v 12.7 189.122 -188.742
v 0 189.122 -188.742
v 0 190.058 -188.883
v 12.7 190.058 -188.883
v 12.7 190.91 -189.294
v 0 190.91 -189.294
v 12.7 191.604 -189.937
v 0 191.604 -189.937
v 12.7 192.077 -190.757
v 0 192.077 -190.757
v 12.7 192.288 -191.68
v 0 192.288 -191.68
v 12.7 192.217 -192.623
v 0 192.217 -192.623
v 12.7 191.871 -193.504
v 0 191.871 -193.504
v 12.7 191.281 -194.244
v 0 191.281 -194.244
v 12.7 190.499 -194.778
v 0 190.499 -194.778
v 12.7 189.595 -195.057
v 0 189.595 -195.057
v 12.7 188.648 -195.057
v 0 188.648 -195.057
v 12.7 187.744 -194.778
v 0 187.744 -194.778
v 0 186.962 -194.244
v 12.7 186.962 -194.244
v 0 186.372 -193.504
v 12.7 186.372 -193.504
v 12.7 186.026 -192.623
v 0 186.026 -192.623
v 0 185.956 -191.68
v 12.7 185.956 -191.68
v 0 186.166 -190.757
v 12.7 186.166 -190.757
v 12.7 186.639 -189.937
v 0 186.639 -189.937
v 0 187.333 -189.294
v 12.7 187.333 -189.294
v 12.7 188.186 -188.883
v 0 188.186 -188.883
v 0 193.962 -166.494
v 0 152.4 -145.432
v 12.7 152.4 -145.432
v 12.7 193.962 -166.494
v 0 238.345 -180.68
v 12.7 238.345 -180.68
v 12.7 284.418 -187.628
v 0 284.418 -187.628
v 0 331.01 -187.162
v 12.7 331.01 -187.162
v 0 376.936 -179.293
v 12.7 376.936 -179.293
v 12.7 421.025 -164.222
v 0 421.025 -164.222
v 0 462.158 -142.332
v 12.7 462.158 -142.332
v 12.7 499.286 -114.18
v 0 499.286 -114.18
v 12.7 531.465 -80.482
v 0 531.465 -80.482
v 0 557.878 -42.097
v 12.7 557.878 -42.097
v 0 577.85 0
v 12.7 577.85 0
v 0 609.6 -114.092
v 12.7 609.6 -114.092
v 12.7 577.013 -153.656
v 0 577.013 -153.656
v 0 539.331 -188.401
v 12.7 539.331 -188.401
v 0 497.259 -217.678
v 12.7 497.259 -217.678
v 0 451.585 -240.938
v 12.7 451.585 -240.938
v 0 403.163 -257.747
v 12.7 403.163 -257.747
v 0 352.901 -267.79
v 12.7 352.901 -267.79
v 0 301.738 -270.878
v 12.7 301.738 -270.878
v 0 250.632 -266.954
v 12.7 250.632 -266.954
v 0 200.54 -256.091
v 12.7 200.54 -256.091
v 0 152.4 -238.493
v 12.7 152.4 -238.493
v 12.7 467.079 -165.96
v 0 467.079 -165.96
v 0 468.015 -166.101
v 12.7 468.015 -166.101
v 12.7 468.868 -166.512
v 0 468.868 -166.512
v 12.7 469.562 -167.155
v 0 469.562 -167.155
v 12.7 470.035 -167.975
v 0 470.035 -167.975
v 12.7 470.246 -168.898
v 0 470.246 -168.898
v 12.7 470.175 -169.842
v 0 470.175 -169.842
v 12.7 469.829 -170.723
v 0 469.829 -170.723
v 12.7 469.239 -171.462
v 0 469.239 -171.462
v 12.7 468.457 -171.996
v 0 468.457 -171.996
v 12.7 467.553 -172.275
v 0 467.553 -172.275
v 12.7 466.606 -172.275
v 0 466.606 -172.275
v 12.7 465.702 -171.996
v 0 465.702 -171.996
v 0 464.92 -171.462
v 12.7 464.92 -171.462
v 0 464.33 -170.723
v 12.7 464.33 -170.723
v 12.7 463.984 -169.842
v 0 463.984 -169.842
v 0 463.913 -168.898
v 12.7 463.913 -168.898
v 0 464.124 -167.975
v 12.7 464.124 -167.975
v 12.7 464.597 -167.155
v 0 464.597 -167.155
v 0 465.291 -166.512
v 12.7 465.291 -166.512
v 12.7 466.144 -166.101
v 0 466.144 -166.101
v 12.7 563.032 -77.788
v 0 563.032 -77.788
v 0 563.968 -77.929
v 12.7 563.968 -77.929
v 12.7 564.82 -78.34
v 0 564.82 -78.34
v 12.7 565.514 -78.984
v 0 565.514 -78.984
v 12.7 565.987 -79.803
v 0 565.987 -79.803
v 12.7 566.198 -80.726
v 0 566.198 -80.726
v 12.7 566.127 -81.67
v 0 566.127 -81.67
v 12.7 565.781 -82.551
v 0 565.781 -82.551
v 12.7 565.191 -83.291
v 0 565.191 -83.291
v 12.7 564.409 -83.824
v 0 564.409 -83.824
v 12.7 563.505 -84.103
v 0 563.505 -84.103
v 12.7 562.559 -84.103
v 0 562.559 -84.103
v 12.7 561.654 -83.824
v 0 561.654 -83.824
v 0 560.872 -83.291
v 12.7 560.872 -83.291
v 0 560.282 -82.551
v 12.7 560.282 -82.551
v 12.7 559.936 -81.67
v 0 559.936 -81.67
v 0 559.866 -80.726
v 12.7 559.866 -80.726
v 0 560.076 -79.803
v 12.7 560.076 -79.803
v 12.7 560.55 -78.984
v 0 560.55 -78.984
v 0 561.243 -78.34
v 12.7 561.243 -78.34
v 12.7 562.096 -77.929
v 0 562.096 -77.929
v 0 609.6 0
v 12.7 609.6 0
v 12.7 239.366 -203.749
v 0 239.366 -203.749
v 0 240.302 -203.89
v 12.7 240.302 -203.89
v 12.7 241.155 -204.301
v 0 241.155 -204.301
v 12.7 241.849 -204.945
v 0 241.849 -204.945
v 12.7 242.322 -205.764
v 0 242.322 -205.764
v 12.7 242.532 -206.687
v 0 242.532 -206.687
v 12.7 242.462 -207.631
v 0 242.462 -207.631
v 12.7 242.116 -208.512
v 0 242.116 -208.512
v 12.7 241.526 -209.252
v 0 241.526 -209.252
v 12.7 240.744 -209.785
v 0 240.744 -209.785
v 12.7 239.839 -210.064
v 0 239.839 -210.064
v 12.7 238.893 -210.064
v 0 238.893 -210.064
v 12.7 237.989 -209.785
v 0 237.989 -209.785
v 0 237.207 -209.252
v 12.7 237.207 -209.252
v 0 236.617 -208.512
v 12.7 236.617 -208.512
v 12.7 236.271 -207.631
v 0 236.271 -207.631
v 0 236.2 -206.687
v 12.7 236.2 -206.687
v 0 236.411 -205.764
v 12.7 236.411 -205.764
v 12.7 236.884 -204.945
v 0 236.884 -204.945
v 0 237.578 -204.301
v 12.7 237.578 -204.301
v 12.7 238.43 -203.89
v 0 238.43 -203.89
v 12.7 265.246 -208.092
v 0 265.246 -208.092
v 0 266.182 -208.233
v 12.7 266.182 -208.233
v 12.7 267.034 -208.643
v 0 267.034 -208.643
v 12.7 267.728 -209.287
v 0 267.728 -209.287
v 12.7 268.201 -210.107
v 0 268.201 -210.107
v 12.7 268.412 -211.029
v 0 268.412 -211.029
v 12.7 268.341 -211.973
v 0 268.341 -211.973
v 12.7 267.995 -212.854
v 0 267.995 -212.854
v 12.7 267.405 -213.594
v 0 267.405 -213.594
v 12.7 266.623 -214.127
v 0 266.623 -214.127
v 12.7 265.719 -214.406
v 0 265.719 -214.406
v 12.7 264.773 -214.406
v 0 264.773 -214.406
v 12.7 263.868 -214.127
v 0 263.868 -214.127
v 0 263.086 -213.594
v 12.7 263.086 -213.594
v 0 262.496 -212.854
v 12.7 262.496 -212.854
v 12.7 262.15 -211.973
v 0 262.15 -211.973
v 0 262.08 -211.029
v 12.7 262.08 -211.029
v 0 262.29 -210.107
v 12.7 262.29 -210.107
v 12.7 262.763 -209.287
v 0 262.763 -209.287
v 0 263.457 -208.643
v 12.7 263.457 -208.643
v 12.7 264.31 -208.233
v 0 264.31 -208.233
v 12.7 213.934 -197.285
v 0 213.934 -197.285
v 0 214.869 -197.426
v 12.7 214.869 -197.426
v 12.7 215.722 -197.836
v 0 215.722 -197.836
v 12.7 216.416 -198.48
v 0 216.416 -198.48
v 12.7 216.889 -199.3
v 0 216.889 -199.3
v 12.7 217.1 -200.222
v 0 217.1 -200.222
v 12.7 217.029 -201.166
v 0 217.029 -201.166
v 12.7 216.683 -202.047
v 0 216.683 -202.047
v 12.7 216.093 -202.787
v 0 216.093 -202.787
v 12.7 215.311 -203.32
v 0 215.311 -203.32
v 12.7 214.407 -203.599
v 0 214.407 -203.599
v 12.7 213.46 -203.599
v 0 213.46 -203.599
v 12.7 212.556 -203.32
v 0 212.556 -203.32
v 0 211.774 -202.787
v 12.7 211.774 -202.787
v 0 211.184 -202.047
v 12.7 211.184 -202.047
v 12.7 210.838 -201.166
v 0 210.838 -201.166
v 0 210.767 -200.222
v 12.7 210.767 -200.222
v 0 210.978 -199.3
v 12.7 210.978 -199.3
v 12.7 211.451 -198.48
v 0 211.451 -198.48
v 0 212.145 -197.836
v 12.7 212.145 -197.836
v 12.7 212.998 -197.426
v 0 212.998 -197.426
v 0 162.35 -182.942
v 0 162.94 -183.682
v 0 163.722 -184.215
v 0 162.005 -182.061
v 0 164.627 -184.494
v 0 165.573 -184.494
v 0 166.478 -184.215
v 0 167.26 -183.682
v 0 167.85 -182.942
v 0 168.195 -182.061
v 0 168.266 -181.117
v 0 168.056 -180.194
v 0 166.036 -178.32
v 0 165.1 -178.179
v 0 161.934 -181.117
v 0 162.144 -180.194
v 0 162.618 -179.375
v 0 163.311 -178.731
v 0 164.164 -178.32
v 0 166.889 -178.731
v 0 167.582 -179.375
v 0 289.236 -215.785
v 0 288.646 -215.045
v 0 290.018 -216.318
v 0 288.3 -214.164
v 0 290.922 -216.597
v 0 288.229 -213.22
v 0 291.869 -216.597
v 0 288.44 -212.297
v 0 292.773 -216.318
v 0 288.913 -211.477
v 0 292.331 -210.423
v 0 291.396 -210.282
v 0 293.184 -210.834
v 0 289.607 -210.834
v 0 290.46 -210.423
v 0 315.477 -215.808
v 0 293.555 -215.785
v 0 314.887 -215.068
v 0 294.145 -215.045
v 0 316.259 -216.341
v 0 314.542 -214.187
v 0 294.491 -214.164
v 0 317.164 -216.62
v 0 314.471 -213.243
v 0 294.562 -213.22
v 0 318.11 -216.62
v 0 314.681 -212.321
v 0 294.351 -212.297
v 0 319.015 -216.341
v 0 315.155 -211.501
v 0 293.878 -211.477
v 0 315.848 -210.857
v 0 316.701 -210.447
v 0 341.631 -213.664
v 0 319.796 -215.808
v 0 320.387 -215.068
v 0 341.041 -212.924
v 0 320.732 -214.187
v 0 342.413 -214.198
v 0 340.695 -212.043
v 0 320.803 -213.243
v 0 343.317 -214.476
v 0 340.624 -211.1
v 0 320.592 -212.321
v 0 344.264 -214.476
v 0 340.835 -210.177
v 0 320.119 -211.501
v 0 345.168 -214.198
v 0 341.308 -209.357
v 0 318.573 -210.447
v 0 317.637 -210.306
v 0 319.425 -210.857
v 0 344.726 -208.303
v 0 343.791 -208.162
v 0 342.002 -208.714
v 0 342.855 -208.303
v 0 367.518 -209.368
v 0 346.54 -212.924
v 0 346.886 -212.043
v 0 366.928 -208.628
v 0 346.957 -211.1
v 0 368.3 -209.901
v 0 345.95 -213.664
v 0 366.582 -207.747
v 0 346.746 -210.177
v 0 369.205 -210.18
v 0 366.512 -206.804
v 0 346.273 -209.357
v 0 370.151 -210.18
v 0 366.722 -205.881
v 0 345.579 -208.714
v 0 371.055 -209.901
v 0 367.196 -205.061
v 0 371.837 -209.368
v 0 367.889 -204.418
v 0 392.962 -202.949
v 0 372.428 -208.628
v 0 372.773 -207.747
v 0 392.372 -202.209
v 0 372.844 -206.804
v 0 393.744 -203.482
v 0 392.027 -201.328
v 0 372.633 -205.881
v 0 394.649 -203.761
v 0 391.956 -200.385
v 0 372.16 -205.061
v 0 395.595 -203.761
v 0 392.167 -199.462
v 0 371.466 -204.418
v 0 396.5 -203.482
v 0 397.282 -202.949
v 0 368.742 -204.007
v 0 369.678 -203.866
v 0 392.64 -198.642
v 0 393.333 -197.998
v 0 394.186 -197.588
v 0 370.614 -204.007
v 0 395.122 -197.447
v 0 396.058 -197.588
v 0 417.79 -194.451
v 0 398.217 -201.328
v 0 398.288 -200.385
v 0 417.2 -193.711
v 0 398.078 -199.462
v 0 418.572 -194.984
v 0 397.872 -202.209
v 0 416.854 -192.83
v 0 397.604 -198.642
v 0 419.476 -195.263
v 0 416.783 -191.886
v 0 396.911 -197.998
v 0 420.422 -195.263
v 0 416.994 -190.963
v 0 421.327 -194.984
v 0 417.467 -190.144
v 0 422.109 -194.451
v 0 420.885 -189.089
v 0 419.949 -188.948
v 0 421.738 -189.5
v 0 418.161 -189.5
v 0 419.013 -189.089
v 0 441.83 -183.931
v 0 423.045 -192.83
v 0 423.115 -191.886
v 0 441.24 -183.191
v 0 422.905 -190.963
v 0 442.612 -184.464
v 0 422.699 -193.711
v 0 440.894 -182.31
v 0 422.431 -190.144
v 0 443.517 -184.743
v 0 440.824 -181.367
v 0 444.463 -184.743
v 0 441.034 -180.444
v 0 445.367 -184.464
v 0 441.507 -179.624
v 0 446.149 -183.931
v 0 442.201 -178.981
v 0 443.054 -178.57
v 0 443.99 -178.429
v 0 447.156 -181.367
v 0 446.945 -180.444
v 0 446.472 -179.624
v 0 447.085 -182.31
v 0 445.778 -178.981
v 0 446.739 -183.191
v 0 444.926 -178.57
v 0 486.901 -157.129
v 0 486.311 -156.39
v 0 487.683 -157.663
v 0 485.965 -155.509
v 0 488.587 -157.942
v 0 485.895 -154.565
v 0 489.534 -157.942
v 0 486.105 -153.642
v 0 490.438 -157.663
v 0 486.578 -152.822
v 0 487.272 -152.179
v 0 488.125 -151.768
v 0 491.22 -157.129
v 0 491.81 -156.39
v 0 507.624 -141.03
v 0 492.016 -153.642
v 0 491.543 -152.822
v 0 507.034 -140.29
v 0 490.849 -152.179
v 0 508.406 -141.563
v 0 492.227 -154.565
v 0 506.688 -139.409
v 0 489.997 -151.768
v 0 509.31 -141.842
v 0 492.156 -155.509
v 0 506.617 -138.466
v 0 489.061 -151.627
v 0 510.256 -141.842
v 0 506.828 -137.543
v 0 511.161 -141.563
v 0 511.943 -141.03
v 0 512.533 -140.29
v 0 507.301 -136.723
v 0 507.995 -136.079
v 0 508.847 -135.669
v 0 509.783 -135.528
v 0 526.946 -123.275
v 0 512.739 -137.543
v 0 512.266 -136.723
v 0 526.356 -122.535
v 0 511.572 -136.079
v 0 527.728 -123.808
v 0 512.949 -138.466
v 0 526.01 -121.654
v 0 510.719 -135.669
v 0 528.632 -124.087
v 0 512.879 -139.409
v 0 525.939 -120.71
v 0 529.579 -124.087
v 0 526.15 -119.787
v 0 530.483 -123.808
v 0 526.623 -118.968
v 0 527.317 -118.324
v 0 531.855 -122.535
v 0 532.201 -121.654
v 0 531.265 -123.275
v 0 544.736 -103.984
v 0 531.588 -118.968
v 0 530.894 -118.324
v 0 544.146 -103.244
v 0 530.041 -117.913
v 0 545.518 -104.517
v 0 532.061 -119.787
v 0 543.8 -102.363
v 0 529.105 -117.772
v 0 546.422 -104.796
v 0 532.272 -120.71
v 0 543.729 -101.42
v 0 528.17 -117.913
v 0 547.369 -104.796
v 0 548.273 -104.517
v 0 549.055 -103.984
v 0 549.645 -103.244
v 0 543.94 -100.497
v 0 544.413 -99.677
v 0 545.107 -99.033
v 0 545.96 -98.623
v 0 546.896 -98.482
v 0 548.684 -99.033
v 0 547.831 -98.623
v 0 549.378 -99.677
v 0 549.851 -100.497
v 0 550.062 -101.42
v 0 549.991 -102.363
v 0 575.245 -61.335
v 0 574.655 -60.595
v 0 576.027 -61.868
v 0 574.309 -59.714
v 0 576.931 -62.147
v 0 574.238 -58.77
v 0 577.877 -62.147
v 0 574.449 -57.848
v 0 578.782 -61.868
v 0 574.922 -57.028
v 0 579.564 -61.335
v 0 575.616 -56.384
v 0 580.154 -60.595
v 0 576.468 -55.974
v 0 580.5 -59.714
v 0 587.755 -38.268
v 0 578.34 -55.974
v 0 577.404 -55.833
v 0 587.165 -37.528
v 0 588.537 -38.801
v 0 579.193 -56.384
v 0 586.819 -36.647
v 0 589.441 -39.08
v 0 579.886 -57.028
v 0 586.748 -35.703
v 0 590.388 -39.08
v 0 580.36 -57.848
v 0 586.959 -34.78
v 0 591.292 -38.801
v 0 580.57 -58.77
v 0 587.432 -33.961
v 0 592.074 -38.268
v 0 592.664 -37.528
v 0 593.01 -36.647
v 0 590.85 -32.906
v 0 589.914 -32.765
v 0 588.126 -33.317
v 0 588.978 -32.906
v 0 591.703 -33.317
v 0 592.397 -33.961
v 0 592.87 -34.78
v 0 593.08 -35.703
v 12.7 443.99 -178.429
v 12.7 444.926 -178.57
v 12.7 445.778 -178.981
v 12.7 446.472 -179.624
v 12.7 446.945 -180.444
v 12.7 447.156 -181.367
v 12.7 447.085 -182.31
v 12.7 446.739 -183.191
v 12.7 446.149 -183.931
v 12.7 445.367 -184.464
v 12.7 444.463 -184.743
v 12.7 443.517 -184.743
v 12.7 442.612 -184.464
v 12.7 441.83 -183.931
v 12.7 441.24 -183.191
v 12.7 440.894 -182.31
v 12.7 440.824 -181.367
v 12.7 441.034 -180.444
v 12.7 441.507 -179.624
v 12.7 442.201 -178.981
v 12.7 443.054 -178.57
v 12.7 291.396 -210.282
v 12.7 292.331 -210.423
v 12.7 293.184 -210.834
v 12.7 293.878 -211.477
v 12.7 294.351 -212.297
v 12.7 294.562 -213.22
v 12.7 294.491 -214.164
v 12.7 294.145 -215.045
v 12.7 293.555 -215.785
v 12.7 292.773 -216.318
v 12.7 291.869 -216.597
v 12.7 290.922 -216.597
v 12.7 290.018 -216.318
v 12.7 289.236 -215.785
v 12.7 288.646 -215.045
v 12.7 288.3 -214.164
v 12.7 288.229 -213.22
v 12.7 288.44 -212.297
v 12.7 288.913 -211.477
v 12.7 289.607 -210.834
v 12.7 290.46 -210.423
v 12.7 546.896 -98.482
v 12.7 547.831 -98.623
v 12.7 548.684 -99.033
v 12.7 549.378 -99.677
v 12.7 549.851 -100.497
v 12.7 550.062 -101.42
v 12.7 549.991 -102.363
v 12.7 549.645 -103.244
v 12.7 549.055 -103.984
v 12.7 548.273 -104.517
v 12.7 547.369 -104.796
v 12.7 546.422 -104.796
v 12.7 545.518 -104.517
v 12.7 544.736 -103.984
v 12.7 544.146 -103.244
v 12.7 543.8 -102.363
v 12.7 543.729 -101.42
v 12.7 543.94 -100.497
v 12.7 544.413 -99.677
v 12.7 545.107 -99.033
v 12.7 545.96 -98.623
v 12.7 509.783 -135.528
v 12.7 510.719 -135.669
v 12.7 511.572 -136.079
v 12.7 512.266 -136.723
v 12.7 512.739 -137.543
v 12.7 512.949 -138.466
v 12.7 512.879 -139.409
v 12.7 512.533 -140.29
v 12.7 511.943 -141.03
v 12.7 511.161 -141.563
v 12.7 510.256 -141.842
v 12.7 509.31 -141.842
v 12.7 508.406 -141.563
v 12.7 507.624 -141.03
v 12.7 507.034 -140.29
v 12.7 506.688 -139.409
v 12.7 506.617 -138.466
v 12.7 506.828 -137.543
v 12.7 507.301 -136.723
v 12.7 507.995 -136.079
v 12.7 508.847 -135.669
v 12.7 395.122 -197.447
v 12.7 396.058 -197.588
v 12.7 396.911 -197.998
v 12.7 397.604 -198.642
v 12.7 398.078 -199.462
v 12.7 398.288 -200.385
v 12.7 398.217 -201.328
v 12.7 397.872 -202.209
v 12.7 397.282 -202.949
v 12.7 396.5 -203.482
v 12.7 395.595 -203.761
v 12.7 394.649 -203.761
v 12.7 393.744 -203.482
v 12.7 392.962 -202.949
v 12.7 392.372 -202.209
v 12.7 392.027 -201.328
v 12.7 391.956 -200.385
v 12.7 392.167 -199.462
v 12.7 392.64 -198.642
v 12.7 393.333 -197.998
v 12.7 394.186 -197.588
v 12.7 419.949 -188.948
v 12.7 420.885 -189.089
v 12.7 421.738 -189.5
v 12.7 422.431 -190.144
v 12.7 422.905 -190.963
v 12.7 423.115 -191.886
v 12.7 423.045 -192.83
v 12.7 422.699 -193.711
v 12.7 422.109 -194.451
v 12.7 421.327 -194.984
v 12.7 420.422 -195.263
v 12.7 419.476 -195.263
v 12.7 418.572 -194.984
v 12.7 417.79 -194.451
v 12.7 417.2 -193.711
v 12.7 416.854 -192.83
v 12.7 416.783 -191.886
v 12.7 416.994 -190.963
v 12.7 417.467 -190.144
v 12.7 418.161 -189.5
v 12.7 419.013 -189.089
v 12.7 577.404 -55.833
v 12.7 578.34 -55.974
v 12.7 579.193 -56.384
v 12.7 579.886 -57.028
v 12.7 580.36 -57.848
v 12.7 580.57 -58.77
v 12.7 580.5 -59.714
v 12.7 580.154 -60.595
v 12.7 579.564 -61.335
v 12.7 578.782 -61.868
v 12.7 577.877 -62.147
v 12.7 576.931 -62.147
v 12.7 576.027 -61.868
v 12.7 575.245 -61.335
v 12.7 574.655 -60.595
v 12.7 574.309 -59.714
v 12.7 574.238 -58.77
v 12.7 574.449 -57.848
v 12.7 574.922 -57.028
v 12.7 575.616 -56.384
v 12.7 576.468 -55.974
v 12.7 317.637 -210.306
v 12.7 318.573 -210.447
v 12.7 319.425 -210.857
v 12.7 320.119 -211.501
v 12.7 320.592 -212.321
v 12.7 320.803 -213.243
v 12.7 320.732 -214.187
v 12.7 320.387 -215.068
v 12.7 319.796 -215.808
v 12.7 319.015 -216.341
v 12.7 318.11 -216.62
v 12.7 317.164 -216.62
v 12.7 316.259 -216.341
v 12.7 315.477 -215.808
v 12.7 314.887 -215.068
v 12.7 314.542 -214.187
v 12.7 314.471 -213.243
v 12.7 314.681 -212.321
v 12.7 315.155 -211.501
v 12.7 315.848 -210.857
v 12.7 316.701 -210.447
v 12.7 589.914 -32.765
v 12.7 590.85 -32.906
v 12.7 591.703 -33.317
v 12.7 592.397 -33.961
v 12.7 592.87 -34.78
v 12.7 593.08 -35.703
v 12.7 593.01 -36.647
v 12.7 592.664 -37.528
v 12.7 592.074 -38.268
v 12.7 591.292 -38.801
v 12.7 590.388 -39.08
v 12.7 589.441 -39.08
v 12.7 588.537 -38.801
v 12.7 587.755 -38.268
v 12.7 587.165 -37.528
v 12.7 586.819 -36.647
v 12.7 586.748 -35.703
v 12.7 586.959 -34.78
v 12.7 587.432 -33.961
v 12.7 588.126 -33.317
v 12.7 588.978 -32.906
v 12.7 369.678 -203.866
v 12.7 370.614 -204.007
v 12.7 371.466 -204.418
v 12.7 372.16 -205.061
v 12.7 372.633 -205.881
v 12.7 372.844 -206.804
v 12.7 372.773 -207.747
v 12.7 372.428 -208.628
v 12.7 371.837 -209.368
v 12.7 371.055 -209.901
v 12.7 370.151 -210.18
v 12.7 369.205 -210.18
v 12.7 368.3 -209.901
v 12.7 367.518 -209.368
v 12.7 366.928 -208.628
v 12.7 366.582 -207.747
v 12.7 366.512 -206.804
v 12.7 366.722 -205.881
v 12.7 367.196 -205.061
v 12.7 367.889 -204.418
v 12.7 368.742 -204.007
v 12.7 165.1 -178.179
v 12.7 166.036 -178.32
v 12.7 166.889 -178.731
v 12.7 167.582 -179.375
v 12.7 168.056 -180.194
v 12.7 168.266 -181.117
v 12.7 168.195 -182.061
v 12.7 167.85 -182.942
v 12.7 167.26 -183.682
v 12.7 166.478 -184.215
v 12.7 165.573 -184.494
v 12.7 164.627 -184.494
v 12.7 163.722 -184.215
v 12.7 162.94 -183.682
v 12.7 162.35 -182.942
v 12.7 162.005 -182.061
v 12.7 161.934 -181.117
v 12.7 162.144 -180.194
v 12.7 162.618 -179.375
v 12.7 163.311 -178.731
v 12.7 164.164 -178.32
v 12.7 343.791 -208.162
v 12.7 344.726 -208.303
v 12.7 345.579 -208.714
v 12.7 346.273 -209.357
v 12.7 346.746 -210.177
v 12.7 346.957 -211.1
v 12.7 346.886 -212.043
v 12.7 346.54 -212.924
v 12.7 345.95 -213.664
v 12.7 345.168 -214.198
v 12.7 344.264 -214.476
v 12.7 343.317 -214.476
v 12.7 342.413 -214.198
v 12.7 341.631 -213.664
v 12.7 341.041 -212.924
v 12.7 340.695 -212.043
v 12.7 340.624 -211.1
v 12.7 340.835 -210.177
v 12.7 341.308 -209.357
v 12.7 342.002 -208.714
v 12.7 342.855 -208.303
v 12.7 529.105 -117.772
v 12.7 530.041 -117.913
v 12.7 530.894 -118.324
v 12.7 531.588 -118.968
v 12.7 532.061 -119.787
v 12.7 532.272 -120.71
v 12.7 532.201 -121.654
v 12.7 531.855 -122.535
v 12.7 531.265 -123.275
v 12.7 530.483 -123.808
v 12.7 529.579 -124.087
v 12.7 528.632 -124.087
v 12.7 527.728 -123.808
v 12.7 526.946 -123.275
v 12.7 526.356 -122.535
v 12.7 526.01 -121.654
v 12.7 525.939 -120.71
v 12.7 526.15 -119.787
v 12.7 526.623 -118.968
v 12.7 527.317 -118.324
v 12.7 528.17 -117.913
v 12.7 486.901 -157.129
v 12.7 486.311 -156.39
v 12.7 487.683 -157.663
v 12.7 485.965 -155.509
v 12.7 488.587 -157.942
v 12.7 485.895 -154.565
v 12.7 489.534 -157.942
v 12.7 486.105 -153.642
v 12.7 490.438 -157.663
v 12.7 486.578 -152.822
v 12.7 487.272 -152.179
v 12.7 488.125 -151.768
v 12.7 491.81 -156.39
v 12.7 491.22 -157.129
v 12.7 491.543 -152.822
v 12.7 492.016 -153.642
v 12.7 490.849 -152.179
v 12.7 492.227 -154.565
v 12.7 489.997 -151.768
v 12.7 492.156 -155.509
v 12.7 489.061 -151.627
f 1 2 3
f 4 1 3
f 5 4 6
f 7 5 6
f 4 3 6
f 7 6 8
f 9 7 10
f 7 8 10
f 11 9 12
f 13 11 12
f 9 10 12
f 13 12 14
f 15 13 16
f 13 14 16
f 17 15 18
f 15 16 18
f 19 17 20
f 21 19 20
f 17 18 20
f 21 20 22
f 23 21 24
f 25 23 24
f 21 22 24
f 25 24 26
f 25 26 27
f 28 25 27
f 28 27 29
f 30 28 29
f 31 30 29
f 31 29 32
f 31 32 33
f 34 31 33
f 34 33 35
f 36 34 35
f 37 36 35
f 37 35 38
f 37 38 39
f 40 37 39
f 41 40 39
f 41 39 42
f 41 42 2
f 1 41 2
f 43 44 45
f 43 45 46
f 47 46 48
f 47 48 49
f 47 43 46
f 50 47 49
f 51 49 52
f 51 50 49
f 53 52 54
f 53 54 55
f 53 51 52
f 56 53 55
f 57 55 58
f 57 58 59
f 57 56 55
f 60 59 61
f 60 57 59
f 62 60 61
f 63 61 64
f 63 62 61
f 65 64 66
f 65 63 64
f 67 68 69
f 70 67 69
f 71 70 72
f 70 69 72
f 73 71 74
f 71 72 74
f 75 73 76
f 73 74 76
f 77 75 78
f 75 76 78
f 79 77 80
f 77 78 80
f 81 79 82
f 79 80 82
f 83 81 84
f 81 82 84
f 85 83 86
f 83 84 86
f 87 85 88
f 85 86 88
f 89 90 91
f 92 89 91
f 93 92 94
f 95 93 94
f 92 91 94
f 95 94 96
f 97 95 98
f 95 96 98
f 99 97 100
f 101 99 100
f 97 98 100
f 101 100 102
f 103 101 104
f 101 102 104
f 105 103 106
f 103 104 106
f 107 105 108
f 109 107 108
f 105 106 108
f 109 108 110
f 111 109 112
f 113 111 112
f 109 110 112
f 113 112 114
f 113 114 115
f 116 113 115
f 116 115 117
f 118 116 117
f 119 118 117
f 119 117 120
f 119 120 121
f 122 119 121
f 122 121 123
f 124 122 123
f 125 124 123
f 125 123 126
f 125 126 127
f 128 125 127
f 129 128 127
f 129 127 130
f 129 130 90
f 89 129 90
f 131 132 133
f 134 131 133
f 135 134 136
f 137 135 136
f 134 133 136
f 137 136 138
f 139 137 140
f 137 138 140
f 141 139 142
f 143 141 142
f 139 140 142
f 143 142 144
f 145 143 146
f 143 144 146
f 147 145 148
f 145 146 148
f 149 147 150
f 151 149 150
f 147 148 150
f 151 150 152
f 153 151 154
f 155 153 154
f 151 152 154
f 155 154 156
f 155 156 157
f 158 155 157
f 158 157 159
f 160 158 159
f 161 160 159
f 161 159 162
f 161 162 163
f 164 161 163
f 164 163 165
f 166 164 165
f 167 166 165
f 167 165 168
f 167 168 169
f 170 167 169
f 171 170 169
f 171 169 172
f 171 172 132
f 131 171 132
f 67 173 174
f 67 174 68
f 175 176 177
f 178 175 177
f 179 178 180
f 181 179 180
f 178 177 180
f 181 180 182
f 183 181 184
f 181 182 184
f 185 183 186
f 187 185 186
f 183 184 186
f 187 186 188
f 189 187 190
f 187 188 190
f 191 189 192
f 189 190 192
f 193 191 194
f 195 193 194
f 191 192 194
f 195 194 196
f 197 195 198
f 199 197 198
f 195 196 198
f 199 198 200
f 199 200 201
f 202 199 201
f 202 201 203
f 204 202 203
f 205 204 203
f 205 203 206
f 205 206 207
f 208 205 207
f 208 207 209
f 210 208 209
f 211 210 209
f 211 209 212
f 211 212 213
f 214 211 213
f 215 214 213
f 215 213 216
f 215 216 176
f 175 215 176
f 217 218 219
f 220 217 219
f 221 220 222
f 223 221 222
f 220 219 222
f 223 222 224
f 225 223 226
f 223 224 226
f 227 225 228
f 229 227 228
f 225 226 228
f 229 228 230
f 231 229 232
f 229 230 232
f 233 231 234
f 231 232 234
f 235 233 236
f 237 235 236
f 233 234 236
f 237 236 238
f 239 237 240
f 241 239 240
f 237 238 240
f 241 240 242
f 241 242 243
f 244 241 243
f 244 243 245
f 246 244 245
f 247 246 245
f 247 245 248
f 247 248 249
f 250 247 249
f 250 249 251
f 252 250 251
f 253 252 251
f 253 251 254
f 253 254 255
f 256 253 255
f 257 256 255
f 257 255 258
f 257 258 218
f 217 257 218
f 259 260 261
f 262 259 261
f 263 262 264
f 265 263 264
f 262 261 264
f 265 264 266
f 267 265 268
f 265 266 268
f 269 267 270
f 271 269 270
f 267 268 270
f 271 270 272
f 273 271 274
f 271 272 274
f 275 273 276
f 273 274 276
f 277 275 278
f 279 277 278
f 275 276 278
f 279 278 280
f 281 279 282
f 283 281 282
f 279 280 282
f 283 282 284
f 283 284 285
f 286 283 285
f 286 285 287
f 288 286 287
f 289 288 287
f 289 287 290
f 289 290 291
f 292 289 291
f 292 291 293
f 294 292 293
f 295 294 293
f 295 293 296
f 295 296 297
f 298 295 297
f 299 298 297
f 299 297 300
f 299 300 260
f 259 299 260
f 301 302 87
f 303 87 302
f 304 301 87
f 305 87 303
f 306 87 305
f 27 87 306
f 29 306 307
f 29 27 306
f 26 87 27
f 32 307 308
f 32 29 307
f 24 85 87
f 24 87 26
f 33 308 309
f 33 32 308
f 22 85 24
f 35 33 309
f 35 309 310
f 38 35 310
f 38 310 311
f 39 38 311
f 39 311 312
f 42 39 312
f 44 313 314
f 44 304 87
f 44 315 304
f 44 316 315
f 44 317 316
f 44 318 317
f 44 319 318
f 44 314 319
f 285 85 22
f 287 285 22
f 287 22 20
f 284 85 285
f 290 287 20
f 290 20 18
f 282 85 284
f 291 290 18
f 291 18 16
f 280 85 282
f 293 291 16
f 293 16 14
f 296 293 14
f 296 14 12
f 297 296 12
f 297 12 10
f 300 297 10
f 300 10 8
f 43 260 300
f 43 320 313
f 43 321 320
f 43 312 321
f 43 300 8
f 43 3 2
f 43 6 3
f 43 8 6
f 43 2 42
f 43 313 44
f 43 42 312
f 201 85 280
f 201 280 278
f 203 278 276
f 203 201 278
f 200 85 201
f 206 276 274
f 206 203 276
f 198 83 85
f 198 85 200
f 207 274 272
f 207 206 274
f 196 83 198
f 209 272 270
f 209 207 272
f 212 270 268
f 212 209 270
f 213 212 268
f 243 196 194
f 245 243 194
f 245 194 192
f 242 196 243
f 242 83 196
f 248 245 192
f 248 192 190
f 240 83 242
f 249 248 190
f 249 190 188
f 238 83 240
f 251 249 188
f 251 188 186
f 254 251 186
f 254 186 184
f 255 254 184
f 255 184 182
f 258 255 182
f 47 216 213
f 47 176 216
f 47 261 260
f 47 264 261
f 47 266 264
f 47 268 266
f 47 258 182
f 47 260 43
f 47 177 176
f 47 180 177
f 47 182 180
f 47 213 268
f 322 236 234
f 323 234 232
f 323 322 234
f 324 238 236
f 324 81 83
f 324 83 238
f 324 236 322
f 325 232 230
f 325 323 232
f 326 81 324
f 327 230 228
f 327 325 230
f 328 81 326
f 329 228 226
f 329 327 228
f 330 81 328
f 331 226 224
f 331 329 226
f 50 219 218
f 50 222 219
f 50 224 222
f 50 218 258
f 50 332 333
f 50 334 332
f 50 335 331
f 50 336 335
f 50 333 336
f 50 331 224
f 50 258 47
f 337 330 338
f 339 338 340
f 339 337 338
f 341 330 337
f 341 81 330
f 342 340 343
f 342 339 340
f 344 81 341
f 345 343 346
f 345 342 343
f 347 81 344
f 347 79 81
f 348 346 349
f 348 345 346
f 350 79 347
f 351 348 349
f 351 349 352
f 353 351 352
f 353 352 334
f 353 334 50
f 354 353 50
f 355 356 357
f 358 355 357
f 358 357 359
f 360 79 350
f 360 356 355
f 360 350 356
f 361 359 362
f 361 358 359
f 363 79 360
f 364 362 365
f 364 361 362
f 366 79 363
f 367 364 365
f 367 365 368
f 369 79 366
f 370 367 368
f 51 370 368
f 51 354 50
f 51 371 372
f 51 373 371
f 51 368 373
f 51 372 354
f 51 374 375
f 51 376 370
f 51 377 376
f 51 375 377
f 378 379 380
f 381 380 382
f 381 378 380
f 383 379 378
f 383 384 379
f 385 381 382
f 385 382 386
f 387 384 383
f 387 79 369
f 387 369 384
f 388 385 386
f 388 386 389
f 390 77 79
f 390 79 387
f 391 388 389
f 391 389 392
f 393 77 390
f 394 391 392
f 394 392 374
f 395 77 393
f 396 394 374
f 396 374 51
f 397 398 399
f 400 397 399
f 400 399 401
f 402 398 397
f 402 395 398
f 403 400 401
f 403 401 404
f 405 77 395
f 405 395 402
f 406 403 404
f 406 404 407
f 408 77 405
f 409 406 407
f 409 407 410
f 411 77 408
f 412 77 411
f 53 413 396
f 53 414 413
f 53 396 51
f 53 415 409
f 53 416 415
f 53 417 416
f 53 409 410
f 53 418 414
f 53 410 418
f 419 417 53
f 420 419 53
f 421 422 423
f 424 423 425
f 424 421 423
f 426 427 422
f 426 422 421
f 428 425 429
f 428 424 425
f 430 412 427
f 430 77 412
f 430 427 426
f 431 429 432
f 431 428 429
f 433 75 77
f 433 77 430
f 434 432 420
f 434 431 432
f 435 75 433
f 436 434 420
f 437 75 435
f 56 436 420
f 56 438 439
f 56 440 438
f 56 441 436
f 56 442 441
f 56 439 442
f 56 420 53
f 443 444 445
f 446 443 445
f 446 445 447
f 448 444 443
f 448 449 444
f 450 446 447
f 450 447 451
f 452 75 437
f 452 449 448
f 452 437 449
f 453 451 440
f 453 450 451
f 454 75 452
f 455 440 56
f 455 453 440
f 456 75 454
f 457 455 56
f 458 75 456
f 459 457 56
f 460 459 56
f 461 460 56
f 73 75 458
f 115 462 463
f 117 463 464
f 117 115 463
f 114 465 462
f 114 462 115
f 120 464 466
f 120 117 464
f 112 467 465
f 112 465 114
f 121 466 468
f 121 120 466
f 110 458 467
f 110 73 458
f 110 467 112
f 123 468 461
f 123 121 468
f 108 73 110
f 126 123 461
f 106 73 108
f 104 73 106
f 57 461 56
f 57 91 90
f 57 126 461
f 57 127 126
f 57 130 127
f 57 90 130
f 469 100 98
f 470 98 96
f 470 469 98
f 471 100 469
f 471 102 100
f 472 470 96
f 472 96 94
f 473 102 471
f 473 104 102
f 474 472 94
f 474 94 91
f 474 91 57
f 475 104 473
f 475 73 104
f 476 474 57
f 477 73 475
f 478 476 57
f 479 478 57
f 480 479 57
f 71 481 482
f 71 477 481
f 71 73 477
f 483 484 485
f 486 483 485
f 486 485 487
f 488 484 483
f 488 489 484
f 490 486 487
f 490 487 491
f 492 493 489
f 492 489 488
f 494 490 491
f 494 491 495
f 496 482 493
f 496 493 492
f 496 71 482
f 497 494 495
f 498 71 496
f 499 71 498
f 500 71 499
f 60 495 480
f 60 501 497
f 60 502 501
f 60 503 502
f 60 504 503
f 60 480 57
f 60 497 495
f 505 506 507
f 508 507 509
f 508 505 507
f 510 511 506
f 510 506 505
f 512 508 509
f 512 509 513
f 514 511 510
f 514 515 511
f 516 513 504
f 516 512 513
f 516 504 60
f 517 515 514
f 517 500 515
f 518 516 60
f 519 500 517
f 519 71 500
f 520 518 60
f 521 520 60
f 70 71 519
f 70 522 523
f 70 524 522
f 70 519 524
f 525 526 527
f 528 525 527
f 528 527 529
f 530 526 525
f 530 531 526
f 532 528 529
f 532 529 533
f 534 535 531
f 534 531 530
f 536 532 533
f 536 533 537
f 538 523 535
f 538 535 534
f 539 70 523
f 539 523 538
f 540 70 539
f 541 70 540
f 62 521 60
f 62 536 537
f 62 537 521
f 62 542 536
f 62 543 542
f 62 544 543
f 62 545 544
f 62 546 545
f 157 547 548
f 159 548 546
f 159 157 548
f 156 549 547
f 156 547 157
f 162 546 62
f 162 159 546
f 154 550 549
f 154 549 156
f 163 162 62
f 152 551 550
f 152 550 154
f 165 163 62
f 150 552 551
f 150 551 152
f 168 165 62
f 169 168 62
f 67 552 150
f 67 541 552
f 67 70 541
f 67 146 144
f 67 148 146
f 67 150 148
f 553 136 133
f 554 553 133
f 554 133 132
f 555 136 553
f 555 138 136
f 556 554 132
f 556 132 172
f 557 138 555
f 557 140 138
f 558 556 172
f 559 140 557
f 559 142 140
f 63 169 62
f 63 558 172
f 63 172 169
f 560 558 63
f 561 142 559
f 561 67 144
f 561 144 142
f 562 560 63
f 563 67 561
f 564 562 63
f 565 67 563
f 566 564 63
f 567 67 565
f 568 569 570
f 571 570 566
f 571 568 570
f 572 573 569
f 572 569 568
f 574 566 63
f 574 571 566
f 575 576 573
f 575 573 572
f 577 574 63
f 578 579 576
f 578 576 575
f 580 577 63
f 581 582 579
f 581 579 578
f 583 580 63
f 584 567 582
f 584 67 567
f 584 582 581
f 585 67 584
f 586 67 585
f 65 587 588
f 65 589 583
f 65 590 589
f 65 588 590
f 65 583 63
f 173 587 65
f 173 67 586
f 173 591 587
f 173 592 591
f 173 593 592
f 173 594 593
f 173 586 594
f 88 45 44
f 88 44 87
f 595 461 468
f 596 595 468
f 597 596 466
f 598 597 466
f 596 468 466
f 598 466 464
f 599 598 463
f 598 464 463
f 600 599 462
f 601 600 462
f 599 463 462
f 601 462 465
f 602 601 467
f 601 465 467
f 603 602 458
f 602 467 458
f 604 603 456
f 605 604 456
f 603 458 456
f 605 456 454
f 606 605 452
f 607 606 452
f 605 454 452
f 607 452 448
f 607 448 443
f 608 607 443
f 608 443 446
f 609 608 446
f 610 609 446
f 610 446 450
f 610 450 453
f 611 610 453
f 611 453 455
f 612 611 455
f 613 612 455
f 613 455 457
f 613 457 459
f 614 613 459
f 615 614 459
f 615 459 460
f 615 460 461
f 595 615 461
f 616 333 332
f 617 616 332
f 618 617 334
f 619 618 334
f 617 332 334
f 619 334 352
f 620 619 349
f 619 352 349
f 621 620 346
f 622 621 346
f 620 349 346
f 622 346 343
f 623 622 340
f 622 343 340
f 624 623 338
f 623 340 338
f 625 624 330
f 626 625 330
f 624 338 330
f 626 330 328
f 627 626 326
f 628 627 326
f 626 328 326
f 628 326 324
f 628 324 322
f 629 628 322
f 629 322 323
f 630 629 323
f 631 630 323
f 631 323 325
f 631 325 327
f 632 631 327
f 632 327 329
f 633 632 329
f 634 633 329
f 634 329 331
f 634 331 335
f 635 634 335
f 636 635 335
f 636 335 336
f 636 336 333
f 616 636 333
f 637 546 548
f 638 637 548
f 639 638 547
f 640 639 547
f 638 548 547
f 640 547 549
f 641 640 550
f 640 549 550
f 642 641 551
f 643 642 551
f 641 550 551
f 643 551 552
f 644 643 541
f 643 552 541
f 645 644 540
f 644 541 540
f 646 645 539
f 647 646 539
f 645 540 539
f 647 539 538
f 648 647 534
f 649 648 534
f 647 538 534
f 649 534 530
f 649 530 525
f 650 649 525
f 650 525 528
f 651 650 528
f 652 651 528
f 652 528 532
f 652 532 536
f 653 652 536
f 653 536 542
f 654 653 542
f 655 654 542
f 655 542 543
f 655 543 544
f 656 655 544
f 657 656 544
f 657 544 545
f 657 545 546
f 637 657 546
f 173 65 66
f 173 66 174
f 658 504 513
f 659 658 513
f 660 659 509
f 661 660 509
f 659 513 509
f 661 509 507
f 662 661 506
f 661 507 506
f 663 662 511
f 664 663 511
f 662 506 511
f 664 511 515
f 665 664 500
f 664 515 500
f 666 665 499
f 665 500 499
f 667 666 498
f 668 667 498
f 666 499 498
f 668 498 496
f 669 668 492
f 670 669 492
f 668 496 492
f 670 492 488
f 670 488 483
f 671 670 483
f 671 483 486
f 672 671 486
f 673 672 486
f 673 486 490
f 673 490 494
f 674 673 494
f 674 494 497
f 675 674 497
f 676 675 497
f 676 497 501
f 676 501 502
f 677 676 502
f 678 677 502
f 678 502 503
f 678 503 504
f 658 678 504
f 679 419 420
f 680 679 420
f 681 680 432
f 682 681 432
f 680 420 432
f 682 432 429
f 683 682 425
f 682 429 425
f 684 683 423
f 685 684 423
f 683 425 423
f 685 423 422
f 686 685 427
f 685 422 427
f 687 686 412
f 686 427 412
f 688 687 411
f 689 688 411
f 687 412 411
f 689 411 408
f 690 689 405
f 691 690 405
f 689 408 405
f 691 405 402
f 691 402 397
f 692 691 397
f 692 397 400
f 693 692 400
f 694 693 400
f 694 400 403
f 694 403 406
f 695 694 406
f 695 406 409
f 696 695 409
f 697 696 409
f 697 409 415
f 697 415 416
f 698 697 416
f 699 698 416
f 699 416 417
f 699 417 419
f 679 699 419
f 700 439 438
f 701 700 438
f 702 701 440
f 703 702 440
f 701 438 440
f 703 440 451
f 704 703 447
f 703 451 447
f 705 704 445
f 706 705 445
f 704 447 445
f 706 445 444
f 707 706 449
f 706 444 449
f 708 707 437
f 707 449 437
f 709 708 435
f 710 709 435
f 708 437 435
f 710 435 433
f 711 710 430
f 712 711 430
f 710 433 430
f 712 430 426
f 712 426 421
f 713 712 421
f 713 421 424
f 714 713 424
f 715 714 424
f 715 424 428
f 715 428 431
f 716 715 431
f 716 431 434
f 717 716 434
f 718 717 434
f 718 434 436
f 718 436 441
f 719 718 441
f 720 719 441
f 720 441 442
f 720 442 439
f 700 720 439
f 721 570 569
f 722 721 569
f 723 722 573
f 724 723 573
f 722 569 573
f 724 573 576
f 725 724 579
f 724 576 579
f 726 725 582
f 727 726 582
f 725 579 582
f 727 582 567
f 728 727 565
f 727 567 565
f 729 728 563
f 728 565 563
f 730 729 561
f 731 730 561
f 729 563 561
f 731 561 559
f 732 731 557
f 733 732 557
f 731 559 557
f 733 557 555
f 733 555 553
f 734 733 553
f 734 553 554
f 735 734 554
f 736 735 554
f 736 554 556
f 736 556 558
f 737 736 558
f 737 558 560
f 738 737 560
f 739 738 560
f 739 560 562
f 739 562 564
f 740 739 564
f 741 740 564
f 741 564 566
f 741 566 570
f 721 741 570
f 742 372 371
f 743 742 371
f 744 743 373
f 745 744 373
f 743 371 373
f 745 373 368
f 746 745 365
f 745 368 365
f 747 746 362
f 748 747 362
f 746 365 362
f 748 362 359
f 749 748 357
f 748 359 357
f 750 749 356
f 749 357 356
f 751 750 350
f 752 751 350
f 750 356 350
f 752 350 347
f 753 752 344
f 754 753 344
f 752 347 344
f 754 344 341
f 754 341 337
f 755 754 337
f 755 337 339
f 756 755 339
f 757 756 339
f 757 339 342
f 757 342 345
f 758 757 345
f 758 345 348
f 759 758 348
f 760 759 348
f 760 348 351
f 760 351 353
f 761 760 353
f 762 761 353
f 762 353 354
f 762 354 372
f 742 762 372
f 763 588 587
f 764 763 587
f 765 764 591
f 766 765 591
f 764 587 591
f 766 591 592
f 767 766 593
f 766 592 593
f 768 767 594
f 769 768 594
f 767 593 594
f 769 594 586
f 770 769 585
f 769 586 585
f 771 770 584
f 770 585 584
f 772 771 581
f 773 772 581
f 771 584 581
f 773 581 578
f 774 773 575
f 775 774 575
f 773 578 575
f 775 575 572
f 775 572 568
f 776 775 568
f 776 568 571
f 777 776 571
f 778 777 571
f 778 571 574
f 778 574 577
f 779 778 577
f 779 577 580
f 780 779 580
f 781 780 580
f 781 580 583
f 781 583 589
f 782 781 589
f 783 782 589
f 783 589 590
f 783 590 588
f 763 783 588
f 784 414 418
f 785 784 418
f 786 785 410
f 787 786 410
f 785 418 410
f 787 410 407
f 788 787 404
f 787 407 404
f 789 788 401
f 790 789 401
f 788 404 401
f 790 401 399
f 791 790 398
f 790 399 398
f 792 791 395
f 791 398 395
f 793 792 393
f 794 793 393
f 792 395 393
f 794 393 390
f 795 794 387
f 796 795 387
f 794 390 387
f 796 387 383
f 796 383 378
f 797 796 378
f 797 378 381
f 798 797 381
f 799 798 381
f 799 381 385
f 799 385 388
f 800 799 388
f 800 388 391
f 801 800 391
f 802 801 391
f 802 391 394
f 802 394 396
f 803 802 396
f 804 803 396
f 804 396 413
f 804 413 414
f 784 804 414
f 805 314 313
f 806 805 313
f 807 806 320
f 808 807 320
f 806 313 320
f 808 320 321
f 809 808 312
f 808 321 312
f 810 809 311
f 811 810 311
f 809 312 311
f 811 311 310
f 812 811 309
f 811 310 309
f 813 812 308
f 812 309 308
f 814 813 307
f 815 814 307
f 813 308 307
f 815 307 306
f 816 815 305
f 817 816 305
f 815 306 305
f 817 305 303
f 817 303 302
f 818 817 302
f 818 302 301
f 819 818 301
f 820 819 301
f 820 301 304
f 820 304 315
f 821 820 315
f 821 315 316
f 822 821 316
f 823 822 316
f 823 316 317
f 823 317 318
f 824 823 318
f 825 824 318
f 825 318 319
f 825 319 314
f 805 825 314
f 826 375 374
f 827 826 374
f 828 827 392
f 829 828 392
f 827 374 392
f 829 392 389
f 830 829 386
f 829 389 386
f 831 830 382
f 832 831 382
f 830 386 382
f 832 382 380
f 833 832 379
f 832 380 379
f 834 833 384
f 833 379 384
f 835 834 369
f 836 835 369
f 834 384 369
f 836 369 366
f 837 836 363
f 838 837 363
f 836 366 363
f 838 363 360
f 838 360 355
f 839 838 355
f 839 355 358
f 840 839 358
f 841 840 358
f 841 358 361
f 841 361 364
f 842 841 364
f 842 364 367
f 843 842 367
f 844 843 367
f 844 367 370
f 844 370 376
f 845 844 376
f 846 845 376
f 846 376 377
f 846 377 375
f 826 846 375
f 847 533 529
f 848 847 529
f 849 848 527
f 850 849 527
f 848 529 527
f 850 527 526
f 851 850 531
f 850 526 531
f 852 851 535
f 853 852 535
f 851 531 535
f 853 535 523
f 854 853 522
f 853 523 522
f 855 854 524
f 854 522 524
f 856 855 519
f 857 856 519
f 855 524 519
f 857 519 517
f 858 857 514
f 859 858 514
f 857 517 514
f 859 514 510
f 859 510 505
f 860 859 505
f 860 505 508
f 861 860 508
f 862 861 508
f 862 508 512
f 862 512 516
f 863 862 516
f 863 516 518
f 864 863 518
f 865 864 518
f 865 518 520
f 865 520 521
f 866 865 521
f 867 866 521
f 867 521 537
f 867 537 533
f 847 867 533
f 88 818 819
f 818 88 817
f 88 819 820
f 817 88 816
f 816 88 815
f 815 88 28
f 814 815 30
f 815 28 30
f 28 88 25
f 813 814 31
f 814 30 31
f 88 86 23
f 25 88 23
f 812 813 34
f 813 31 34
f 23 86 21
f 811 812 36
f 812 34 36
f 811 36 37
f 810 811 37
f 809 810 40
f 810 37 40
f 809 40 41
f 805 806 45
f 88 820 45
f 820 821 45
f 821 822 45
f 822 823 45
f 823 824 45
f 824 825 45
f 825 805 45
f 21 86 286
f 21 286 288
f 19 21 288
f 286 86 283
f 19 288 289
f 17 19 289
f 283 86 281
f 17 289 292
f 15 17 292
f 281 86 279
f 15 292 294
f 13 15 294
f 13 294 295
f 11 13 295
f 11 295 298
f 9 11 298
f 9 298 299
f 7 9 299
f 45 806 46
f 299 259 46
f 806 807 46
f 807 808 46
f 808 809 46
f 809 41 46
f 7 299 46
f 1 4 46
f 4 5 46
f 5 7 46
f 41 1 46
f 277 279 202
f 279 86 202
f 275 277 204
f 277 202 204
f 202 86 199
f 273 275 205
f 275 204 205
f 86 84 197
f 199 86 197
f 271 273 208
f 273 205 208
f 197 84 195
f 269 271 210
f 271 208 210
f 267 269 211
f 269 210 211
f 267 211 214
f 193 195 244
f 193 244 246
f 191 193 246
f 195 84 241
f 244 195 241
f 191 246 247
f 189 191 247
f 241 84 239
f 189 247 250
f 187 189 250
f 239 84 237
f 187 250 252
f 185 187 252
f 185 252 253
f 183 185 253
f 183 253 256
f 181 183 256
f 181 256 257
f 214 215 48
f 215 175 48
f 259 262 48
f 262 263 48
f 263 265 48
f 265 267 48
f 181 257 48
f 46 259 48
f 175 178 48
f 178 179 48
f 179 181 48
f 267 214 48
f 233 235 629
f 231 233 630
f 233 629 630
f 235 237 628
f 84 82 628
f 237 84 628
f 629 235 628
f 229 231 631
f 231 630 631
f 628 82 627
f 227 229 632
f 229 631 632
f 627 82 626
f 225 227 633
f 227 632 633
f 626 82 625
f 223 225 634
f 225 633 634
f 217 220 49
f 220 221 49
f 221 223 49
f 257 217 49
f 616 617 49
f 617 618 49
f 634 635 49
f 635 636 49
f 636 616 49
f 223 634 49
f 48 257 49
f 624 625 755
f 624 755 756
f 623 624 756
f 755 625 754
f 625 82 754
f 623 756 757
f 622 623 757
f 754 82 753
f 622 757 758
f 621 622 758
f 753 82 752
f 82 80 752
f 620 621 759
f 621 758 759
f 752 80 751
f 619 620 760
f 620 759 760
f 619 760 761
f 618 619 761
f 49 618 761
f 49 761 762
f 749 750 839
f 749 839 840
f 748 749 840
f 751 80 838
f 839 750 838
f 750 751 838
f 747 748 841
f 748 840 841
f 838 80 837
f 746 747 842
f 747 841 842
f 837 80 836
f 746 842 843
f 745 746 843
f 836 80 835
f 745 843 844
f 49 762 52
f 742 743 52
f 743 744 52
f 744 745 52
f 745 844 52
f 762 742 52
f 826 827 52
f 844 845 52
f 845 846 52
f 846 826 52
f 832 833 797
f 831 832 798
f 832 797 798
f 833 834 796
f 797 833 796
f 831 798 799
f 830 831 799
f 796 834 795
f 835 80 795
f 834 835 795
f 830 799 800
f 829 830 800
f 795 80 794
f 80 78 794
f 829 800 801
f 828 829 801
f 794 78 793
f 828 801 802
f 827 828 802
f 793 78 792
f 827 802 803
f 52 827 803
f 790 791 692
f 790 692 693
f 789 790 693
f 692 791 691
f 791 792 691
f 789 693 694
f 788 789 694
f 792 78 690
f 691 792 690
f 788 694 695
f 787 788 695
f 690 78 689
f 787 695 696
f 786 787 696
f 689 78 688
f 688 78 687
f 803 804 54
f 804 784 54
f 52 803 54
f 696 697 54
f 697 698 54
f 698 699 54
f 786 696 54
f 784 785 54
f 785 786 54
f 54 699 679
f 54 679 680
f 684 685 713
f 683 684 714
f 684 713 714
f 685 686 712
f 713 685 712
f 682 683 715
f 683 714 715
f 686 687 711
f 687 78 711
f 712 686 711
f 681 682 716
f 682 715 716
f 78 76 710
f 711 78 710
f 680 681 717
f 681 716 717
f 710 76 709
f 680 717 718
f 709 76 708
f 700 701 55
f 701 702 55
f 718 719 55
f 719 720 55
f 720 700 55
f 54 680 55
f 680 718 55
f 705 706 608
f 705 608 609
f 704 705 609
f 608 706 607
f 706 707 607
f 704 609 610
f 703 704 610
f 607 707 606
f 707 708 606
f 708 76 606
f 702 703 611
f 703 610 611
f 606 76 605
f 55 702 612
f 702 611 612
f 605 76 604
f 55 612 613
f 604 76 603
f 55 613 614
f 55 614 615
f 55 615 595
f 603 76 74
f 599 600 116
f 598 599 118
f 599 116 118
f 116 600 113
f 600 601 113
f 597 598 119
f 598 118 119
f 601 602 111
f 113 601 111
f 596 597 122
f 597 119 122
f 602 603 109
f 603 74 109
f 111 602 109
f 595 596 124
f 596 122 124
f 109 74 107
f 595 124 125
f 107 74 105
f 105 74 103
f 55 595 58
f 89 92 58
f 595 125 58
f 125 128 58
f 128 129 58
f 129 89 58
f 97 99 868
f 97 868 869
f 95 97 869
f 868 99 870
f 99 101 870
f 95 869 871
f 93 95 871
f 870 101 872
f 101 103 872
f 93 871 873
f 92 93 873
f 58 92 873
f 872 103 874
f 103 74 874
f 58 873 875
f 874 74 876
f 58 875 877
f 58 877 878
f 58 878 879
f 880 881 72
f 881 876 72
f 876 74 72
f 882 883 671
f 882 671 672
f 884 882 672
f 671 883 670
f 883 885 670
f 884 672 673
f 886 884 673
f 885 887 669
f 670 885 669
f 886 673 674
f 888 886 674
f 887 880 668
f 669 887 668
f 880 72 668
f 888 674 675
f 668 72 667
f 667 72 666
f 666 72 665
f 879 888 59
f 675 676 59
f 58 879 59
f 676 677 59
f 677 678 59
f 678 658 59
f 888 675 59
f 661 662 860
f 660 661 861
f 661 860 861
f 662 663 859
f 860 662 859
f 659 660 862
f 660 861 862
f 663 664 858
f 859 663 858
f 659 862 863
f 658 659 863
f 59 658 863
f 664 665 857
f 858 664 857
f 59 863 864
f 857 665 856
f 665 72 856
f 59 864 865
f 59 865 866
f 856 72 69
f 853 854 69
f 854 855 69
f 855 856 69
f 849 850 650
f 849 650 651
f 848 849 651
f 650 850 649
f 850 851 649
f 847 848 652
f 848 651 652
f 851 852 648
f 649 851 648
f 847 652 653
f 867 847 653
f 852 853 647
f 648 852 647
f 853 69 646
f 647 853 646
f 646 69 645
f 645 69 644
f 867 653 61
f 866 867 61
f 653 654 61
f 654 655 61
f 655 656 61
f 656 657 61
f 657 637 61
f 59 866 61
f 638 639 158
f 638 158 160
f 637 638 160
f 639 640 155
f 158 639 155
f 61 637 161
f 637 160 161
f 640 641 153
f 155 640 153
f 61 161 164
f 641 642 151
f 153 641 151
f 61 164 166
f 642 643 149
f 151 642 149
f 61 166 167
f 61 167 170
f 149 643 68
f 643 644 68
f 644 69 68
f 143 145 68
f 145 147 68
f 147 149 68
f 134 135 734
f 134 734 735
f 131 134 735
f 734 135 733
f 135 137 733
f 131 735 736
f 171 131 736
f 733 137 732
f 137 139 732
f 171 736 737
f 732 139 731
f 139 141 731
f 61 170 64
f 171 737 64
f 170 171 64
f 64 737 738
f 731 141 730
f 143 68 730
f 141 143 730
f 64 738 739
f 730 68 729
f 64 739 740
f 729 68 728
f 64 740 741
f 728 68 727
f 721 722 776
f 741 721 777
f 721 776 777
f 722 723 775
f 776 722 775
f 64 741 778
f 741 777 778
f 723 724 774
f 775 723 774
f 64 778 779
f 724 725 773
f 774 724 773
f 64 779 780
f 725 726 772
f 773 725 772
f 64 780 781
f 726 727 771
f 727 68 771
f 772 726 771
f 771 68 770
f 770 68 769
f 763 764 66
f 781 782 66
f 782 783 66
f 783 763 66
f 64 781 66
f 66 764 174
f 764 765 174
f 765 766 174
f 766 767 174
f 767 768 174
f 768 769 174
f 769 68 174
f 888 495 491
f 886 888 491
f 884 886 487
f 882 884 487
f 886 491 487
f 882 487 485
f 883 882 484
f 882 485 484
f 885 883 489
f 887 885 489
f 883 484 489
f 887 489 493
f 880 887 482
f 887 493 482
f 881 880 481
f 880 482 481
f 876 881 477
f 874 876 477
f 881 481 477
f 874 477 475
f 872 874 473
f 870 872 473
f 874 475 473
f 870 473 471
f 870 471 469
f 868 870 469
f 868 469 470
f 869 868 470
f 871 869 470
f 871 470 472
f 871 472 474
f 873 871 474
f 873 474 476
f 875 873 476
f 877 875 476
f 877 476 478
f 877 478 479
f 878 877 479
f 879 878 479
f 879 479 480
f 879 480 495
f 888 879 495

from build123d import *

# Parameters (mm, degrees)
BOSS_EXTRUDE1_DEPTH         = 12.7
SKETCH2_W                   = 852.307145123
SKETCH2_H                   = 152.4
CUT_EXTRUDE1_DEPTH          = 12.7
CUT_EXTRUDE2_DEPTH          = 12.7
F_1_4_0_25_DIAMETER_HOLE1_D = 6.35
CUT_EXTRUDE3_DEPTH          = 13.7


with BuildPart() as part:
    # Sketch1 → Boss-Extrude1 (new body)
    with BuildSketch(Plane(origin=(0, 0, 0), x_dir=(0, 0, -1), z_dir=(1, 0, 0))):
        with BuildLine():
            Line((0, 609.6), (323.85, 609.6))
            Line((323.85, 609.6), (323.85, 0))
            Line((323.85, 0), (0, 0))
            Line((0, 0), (0, 31.75))
            ThreePointArc((0, 31.75), (188.340145046, 304.8), (0, 577.85))
            Line((0, 577.85), (0, 609.6))
        make_face()
    extrude(amount=BOSS_EXTRUDE1_DEPTH)

    # Sketch2 → Cut-Extrude1 (cut)
    with BuildSketch(Plane(origin=(12.7, 0, 0), x_dir=(0, 0, -1), z_dir=(1, 0, 0))):
        with Locations((192.653341095, 76.2)):
            Rectangle(SKETCH2_W, SKETCH2_H)
    extrude(amount=-CUT_EXTRUDE1_DEPTH, mode=Mode.SUBTRACT)

    # Sketch3 → Cut-Extrude2 (cut)
    with BuildSketch(Plane(origin=(12.7, 0, 0), x_dir=(0, 0, -1), z_dir=(1, 0, 0))):
        with BuildLine():
            Line((270.760801555, 152.4), (323.85, 152.4))
            Line((323.85, 152.4), (323.85, 609.6))
            Line((323.85, 609.6), (161.925, 609.6))
            ThreePointArc((161.925, 609.6), (289.589524386, 398.436253262), (270.760801555, 152.4))
        make_face()
    extrude(amount=-CUT_EXTRUDE2_DEPTH, mode=Mode.SUBTRACT)

    # 1/4 (0.25) Diameter Hole1 (through all)
    with Locations(Plane(origin=(12.7, 0, 0), x_dir=(0, 0, -1), z_dir=(1, 0, 0))):
        with Locations((181.354437919, 165.1), (191.91696262, 189.121698017), (200.459714845, 213.933596133), (206.924338933, 239.366203925), (211.266674948, 265.245790893), (213.457060331, 291.395573216), (213.480532529, 317.636921367), (211.336931202, 343.790580328), (207.040899322, 369.677894089), (200.621783143, 395.122026048), (192.123431737, 419.949166985), (181.603897461, 443.989722351), (169.1350394, 467.079470776), (154.8020325, 489.060685868), (138.70278573, 509.783213636), (120.94727327, 529.105498206), (101.656783275, 546.89554878), (80.96308935, 563.031841274), (59.00755041, 577.404148448), (35.940145046, 589.914292872)):
            Hole(F_1_4_0_25_DIAMETER_HOLE1_D / 2)

    # Sketch6 → Cut-Extrude3 (cut, through all)
    with BuildSketch(Plane(origin=(12.7, 0, 0), x_dir=(0, 0, -1), z_dir=(1, 0, 0))):
        with BuildLine():
            Line((161.925, 609.6), (114.092348386, 609.6))
            ThreePointArc((114.092348386, 609.6), (257.747151872, 403.163135962), (238.492774693, 152.4))
            Line((238.492774693, 152.4), (270.760801555, 152.4))
            ThreePointArc((270.760801555, 152.4), (289.589524386, 398.436253262), (161.925, 609.6))
        make_face()
    extrude(amount=-CUT_EXTRUDE3_DEPTH, mode=Mode.SUBTRACT)


solid = part.part
